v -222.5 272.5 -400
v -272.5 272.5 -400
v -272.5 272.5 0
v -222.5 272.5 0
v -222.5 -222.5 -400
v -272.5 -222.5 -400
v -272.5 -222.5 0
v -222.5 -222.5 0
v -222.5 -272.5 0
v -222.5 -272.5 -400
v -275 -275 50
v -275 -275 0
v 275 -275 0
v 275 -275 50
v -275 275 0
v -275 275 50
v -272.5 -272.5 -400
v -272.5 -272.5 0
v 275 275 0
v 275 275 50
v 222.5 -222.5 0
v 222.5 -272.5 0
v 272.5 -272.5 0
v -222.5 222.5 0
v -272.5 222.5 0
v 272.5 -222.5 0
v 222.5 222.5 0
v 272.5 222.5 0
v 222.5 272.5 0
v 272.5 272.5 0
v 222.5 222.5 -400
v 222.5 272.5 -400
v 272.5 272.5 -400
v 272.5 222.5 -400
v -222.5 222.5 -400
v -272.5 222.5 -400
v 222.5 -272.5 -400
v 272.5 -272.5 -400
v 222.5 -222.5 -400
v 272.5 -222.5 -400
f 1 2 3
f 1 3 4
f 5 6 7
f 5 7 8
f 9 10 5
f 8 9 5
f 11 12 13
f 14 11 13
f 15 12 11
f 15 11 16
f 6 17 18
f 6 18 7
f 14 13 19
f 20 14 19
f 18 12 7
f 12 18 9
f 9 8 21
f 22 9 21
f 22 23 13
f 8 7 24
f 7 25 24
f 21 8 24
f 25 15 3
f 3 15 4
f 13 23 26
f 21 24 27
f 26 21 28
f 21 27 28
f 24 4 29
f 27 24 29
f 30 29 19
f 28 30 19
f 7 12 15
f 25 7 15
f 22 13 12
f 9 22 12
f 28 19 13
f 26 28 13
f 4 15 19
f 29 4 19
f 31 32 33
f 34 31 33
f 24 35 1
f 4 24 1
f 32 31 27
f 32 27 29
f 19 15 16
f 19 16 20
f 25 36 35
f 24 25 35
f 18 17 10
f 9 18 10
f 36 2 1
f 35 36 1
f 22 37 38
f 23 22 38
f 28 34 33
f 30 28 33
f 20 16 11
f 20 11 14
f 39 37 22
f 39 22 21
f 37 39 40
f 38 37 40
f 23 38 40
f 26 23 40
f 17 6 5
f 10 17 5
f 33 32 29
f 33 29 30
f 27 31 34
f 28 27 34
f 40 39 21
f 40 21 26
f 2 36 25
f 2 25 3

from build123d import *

# Parameters (mm, degrees)
F0_W          = 550
F0_H          = 550
F1_DEPTH      = 50
F0_W_2        = 50
F0_H_2        = 50
F2_DEPTH      = 50
F2_DEPTH_BACK = 400


with BuildPart() as f1:
    # F0 (on Top) → F1 (new body)
    with BuildSketch(Plane.XY):
        Rectangle(F0_W, F0_H)
        Polygon((222.5, 272.5), (272.5, 272.5), (272.5, 222.5), (272.5, -222.5), (272.5, -272.5), (222.5, -272.5), (-222.5, -272.5), (-272.5, -272.5), (-272.5, -222.5), (-272.5, 222.5), (-272.5, 272.5), (-222.5, 272.5), align=None, mode=Mode.SUBTRACT)
        Polygon((222.5, 222.5), (222.5, 272.5), (-222.5, 272.5), (-222.5, 222.5), (-272.5, 222.5), (-272.5, -222.5), (-222.5, -222.5), (-222.5, -272.5), (222.5, -272.5), (222.5, -222.5), (272.5, -222.5), (272.5, 222.5), align=None)
    extrude(amount=F1_DEPTH)

    # F0 (on Top) → F2 (join, two sides)
    with BuildSketch(Plane.XY) as f2_sk:
        with Locations((-247.5, -247.5)):
            Rectangle(F0_W_2, F0_H_2)
        with Locations((247.5, -247.5)):
            Rectangle(F0_W_2, F0_H_2)
        with Locations((247.5, 247.5)):
            Rectangle(F0_W_2, F0_H_2)
        with Locations((-247.5, 247.5)):
            Rectangle(F0_W_2, F0_H_2)
    extrude(amount=F2_DEPTH)
    extrude(f2_sk.sketch, amount=-F2_DEPTH_BACK)


solid = f1.part
